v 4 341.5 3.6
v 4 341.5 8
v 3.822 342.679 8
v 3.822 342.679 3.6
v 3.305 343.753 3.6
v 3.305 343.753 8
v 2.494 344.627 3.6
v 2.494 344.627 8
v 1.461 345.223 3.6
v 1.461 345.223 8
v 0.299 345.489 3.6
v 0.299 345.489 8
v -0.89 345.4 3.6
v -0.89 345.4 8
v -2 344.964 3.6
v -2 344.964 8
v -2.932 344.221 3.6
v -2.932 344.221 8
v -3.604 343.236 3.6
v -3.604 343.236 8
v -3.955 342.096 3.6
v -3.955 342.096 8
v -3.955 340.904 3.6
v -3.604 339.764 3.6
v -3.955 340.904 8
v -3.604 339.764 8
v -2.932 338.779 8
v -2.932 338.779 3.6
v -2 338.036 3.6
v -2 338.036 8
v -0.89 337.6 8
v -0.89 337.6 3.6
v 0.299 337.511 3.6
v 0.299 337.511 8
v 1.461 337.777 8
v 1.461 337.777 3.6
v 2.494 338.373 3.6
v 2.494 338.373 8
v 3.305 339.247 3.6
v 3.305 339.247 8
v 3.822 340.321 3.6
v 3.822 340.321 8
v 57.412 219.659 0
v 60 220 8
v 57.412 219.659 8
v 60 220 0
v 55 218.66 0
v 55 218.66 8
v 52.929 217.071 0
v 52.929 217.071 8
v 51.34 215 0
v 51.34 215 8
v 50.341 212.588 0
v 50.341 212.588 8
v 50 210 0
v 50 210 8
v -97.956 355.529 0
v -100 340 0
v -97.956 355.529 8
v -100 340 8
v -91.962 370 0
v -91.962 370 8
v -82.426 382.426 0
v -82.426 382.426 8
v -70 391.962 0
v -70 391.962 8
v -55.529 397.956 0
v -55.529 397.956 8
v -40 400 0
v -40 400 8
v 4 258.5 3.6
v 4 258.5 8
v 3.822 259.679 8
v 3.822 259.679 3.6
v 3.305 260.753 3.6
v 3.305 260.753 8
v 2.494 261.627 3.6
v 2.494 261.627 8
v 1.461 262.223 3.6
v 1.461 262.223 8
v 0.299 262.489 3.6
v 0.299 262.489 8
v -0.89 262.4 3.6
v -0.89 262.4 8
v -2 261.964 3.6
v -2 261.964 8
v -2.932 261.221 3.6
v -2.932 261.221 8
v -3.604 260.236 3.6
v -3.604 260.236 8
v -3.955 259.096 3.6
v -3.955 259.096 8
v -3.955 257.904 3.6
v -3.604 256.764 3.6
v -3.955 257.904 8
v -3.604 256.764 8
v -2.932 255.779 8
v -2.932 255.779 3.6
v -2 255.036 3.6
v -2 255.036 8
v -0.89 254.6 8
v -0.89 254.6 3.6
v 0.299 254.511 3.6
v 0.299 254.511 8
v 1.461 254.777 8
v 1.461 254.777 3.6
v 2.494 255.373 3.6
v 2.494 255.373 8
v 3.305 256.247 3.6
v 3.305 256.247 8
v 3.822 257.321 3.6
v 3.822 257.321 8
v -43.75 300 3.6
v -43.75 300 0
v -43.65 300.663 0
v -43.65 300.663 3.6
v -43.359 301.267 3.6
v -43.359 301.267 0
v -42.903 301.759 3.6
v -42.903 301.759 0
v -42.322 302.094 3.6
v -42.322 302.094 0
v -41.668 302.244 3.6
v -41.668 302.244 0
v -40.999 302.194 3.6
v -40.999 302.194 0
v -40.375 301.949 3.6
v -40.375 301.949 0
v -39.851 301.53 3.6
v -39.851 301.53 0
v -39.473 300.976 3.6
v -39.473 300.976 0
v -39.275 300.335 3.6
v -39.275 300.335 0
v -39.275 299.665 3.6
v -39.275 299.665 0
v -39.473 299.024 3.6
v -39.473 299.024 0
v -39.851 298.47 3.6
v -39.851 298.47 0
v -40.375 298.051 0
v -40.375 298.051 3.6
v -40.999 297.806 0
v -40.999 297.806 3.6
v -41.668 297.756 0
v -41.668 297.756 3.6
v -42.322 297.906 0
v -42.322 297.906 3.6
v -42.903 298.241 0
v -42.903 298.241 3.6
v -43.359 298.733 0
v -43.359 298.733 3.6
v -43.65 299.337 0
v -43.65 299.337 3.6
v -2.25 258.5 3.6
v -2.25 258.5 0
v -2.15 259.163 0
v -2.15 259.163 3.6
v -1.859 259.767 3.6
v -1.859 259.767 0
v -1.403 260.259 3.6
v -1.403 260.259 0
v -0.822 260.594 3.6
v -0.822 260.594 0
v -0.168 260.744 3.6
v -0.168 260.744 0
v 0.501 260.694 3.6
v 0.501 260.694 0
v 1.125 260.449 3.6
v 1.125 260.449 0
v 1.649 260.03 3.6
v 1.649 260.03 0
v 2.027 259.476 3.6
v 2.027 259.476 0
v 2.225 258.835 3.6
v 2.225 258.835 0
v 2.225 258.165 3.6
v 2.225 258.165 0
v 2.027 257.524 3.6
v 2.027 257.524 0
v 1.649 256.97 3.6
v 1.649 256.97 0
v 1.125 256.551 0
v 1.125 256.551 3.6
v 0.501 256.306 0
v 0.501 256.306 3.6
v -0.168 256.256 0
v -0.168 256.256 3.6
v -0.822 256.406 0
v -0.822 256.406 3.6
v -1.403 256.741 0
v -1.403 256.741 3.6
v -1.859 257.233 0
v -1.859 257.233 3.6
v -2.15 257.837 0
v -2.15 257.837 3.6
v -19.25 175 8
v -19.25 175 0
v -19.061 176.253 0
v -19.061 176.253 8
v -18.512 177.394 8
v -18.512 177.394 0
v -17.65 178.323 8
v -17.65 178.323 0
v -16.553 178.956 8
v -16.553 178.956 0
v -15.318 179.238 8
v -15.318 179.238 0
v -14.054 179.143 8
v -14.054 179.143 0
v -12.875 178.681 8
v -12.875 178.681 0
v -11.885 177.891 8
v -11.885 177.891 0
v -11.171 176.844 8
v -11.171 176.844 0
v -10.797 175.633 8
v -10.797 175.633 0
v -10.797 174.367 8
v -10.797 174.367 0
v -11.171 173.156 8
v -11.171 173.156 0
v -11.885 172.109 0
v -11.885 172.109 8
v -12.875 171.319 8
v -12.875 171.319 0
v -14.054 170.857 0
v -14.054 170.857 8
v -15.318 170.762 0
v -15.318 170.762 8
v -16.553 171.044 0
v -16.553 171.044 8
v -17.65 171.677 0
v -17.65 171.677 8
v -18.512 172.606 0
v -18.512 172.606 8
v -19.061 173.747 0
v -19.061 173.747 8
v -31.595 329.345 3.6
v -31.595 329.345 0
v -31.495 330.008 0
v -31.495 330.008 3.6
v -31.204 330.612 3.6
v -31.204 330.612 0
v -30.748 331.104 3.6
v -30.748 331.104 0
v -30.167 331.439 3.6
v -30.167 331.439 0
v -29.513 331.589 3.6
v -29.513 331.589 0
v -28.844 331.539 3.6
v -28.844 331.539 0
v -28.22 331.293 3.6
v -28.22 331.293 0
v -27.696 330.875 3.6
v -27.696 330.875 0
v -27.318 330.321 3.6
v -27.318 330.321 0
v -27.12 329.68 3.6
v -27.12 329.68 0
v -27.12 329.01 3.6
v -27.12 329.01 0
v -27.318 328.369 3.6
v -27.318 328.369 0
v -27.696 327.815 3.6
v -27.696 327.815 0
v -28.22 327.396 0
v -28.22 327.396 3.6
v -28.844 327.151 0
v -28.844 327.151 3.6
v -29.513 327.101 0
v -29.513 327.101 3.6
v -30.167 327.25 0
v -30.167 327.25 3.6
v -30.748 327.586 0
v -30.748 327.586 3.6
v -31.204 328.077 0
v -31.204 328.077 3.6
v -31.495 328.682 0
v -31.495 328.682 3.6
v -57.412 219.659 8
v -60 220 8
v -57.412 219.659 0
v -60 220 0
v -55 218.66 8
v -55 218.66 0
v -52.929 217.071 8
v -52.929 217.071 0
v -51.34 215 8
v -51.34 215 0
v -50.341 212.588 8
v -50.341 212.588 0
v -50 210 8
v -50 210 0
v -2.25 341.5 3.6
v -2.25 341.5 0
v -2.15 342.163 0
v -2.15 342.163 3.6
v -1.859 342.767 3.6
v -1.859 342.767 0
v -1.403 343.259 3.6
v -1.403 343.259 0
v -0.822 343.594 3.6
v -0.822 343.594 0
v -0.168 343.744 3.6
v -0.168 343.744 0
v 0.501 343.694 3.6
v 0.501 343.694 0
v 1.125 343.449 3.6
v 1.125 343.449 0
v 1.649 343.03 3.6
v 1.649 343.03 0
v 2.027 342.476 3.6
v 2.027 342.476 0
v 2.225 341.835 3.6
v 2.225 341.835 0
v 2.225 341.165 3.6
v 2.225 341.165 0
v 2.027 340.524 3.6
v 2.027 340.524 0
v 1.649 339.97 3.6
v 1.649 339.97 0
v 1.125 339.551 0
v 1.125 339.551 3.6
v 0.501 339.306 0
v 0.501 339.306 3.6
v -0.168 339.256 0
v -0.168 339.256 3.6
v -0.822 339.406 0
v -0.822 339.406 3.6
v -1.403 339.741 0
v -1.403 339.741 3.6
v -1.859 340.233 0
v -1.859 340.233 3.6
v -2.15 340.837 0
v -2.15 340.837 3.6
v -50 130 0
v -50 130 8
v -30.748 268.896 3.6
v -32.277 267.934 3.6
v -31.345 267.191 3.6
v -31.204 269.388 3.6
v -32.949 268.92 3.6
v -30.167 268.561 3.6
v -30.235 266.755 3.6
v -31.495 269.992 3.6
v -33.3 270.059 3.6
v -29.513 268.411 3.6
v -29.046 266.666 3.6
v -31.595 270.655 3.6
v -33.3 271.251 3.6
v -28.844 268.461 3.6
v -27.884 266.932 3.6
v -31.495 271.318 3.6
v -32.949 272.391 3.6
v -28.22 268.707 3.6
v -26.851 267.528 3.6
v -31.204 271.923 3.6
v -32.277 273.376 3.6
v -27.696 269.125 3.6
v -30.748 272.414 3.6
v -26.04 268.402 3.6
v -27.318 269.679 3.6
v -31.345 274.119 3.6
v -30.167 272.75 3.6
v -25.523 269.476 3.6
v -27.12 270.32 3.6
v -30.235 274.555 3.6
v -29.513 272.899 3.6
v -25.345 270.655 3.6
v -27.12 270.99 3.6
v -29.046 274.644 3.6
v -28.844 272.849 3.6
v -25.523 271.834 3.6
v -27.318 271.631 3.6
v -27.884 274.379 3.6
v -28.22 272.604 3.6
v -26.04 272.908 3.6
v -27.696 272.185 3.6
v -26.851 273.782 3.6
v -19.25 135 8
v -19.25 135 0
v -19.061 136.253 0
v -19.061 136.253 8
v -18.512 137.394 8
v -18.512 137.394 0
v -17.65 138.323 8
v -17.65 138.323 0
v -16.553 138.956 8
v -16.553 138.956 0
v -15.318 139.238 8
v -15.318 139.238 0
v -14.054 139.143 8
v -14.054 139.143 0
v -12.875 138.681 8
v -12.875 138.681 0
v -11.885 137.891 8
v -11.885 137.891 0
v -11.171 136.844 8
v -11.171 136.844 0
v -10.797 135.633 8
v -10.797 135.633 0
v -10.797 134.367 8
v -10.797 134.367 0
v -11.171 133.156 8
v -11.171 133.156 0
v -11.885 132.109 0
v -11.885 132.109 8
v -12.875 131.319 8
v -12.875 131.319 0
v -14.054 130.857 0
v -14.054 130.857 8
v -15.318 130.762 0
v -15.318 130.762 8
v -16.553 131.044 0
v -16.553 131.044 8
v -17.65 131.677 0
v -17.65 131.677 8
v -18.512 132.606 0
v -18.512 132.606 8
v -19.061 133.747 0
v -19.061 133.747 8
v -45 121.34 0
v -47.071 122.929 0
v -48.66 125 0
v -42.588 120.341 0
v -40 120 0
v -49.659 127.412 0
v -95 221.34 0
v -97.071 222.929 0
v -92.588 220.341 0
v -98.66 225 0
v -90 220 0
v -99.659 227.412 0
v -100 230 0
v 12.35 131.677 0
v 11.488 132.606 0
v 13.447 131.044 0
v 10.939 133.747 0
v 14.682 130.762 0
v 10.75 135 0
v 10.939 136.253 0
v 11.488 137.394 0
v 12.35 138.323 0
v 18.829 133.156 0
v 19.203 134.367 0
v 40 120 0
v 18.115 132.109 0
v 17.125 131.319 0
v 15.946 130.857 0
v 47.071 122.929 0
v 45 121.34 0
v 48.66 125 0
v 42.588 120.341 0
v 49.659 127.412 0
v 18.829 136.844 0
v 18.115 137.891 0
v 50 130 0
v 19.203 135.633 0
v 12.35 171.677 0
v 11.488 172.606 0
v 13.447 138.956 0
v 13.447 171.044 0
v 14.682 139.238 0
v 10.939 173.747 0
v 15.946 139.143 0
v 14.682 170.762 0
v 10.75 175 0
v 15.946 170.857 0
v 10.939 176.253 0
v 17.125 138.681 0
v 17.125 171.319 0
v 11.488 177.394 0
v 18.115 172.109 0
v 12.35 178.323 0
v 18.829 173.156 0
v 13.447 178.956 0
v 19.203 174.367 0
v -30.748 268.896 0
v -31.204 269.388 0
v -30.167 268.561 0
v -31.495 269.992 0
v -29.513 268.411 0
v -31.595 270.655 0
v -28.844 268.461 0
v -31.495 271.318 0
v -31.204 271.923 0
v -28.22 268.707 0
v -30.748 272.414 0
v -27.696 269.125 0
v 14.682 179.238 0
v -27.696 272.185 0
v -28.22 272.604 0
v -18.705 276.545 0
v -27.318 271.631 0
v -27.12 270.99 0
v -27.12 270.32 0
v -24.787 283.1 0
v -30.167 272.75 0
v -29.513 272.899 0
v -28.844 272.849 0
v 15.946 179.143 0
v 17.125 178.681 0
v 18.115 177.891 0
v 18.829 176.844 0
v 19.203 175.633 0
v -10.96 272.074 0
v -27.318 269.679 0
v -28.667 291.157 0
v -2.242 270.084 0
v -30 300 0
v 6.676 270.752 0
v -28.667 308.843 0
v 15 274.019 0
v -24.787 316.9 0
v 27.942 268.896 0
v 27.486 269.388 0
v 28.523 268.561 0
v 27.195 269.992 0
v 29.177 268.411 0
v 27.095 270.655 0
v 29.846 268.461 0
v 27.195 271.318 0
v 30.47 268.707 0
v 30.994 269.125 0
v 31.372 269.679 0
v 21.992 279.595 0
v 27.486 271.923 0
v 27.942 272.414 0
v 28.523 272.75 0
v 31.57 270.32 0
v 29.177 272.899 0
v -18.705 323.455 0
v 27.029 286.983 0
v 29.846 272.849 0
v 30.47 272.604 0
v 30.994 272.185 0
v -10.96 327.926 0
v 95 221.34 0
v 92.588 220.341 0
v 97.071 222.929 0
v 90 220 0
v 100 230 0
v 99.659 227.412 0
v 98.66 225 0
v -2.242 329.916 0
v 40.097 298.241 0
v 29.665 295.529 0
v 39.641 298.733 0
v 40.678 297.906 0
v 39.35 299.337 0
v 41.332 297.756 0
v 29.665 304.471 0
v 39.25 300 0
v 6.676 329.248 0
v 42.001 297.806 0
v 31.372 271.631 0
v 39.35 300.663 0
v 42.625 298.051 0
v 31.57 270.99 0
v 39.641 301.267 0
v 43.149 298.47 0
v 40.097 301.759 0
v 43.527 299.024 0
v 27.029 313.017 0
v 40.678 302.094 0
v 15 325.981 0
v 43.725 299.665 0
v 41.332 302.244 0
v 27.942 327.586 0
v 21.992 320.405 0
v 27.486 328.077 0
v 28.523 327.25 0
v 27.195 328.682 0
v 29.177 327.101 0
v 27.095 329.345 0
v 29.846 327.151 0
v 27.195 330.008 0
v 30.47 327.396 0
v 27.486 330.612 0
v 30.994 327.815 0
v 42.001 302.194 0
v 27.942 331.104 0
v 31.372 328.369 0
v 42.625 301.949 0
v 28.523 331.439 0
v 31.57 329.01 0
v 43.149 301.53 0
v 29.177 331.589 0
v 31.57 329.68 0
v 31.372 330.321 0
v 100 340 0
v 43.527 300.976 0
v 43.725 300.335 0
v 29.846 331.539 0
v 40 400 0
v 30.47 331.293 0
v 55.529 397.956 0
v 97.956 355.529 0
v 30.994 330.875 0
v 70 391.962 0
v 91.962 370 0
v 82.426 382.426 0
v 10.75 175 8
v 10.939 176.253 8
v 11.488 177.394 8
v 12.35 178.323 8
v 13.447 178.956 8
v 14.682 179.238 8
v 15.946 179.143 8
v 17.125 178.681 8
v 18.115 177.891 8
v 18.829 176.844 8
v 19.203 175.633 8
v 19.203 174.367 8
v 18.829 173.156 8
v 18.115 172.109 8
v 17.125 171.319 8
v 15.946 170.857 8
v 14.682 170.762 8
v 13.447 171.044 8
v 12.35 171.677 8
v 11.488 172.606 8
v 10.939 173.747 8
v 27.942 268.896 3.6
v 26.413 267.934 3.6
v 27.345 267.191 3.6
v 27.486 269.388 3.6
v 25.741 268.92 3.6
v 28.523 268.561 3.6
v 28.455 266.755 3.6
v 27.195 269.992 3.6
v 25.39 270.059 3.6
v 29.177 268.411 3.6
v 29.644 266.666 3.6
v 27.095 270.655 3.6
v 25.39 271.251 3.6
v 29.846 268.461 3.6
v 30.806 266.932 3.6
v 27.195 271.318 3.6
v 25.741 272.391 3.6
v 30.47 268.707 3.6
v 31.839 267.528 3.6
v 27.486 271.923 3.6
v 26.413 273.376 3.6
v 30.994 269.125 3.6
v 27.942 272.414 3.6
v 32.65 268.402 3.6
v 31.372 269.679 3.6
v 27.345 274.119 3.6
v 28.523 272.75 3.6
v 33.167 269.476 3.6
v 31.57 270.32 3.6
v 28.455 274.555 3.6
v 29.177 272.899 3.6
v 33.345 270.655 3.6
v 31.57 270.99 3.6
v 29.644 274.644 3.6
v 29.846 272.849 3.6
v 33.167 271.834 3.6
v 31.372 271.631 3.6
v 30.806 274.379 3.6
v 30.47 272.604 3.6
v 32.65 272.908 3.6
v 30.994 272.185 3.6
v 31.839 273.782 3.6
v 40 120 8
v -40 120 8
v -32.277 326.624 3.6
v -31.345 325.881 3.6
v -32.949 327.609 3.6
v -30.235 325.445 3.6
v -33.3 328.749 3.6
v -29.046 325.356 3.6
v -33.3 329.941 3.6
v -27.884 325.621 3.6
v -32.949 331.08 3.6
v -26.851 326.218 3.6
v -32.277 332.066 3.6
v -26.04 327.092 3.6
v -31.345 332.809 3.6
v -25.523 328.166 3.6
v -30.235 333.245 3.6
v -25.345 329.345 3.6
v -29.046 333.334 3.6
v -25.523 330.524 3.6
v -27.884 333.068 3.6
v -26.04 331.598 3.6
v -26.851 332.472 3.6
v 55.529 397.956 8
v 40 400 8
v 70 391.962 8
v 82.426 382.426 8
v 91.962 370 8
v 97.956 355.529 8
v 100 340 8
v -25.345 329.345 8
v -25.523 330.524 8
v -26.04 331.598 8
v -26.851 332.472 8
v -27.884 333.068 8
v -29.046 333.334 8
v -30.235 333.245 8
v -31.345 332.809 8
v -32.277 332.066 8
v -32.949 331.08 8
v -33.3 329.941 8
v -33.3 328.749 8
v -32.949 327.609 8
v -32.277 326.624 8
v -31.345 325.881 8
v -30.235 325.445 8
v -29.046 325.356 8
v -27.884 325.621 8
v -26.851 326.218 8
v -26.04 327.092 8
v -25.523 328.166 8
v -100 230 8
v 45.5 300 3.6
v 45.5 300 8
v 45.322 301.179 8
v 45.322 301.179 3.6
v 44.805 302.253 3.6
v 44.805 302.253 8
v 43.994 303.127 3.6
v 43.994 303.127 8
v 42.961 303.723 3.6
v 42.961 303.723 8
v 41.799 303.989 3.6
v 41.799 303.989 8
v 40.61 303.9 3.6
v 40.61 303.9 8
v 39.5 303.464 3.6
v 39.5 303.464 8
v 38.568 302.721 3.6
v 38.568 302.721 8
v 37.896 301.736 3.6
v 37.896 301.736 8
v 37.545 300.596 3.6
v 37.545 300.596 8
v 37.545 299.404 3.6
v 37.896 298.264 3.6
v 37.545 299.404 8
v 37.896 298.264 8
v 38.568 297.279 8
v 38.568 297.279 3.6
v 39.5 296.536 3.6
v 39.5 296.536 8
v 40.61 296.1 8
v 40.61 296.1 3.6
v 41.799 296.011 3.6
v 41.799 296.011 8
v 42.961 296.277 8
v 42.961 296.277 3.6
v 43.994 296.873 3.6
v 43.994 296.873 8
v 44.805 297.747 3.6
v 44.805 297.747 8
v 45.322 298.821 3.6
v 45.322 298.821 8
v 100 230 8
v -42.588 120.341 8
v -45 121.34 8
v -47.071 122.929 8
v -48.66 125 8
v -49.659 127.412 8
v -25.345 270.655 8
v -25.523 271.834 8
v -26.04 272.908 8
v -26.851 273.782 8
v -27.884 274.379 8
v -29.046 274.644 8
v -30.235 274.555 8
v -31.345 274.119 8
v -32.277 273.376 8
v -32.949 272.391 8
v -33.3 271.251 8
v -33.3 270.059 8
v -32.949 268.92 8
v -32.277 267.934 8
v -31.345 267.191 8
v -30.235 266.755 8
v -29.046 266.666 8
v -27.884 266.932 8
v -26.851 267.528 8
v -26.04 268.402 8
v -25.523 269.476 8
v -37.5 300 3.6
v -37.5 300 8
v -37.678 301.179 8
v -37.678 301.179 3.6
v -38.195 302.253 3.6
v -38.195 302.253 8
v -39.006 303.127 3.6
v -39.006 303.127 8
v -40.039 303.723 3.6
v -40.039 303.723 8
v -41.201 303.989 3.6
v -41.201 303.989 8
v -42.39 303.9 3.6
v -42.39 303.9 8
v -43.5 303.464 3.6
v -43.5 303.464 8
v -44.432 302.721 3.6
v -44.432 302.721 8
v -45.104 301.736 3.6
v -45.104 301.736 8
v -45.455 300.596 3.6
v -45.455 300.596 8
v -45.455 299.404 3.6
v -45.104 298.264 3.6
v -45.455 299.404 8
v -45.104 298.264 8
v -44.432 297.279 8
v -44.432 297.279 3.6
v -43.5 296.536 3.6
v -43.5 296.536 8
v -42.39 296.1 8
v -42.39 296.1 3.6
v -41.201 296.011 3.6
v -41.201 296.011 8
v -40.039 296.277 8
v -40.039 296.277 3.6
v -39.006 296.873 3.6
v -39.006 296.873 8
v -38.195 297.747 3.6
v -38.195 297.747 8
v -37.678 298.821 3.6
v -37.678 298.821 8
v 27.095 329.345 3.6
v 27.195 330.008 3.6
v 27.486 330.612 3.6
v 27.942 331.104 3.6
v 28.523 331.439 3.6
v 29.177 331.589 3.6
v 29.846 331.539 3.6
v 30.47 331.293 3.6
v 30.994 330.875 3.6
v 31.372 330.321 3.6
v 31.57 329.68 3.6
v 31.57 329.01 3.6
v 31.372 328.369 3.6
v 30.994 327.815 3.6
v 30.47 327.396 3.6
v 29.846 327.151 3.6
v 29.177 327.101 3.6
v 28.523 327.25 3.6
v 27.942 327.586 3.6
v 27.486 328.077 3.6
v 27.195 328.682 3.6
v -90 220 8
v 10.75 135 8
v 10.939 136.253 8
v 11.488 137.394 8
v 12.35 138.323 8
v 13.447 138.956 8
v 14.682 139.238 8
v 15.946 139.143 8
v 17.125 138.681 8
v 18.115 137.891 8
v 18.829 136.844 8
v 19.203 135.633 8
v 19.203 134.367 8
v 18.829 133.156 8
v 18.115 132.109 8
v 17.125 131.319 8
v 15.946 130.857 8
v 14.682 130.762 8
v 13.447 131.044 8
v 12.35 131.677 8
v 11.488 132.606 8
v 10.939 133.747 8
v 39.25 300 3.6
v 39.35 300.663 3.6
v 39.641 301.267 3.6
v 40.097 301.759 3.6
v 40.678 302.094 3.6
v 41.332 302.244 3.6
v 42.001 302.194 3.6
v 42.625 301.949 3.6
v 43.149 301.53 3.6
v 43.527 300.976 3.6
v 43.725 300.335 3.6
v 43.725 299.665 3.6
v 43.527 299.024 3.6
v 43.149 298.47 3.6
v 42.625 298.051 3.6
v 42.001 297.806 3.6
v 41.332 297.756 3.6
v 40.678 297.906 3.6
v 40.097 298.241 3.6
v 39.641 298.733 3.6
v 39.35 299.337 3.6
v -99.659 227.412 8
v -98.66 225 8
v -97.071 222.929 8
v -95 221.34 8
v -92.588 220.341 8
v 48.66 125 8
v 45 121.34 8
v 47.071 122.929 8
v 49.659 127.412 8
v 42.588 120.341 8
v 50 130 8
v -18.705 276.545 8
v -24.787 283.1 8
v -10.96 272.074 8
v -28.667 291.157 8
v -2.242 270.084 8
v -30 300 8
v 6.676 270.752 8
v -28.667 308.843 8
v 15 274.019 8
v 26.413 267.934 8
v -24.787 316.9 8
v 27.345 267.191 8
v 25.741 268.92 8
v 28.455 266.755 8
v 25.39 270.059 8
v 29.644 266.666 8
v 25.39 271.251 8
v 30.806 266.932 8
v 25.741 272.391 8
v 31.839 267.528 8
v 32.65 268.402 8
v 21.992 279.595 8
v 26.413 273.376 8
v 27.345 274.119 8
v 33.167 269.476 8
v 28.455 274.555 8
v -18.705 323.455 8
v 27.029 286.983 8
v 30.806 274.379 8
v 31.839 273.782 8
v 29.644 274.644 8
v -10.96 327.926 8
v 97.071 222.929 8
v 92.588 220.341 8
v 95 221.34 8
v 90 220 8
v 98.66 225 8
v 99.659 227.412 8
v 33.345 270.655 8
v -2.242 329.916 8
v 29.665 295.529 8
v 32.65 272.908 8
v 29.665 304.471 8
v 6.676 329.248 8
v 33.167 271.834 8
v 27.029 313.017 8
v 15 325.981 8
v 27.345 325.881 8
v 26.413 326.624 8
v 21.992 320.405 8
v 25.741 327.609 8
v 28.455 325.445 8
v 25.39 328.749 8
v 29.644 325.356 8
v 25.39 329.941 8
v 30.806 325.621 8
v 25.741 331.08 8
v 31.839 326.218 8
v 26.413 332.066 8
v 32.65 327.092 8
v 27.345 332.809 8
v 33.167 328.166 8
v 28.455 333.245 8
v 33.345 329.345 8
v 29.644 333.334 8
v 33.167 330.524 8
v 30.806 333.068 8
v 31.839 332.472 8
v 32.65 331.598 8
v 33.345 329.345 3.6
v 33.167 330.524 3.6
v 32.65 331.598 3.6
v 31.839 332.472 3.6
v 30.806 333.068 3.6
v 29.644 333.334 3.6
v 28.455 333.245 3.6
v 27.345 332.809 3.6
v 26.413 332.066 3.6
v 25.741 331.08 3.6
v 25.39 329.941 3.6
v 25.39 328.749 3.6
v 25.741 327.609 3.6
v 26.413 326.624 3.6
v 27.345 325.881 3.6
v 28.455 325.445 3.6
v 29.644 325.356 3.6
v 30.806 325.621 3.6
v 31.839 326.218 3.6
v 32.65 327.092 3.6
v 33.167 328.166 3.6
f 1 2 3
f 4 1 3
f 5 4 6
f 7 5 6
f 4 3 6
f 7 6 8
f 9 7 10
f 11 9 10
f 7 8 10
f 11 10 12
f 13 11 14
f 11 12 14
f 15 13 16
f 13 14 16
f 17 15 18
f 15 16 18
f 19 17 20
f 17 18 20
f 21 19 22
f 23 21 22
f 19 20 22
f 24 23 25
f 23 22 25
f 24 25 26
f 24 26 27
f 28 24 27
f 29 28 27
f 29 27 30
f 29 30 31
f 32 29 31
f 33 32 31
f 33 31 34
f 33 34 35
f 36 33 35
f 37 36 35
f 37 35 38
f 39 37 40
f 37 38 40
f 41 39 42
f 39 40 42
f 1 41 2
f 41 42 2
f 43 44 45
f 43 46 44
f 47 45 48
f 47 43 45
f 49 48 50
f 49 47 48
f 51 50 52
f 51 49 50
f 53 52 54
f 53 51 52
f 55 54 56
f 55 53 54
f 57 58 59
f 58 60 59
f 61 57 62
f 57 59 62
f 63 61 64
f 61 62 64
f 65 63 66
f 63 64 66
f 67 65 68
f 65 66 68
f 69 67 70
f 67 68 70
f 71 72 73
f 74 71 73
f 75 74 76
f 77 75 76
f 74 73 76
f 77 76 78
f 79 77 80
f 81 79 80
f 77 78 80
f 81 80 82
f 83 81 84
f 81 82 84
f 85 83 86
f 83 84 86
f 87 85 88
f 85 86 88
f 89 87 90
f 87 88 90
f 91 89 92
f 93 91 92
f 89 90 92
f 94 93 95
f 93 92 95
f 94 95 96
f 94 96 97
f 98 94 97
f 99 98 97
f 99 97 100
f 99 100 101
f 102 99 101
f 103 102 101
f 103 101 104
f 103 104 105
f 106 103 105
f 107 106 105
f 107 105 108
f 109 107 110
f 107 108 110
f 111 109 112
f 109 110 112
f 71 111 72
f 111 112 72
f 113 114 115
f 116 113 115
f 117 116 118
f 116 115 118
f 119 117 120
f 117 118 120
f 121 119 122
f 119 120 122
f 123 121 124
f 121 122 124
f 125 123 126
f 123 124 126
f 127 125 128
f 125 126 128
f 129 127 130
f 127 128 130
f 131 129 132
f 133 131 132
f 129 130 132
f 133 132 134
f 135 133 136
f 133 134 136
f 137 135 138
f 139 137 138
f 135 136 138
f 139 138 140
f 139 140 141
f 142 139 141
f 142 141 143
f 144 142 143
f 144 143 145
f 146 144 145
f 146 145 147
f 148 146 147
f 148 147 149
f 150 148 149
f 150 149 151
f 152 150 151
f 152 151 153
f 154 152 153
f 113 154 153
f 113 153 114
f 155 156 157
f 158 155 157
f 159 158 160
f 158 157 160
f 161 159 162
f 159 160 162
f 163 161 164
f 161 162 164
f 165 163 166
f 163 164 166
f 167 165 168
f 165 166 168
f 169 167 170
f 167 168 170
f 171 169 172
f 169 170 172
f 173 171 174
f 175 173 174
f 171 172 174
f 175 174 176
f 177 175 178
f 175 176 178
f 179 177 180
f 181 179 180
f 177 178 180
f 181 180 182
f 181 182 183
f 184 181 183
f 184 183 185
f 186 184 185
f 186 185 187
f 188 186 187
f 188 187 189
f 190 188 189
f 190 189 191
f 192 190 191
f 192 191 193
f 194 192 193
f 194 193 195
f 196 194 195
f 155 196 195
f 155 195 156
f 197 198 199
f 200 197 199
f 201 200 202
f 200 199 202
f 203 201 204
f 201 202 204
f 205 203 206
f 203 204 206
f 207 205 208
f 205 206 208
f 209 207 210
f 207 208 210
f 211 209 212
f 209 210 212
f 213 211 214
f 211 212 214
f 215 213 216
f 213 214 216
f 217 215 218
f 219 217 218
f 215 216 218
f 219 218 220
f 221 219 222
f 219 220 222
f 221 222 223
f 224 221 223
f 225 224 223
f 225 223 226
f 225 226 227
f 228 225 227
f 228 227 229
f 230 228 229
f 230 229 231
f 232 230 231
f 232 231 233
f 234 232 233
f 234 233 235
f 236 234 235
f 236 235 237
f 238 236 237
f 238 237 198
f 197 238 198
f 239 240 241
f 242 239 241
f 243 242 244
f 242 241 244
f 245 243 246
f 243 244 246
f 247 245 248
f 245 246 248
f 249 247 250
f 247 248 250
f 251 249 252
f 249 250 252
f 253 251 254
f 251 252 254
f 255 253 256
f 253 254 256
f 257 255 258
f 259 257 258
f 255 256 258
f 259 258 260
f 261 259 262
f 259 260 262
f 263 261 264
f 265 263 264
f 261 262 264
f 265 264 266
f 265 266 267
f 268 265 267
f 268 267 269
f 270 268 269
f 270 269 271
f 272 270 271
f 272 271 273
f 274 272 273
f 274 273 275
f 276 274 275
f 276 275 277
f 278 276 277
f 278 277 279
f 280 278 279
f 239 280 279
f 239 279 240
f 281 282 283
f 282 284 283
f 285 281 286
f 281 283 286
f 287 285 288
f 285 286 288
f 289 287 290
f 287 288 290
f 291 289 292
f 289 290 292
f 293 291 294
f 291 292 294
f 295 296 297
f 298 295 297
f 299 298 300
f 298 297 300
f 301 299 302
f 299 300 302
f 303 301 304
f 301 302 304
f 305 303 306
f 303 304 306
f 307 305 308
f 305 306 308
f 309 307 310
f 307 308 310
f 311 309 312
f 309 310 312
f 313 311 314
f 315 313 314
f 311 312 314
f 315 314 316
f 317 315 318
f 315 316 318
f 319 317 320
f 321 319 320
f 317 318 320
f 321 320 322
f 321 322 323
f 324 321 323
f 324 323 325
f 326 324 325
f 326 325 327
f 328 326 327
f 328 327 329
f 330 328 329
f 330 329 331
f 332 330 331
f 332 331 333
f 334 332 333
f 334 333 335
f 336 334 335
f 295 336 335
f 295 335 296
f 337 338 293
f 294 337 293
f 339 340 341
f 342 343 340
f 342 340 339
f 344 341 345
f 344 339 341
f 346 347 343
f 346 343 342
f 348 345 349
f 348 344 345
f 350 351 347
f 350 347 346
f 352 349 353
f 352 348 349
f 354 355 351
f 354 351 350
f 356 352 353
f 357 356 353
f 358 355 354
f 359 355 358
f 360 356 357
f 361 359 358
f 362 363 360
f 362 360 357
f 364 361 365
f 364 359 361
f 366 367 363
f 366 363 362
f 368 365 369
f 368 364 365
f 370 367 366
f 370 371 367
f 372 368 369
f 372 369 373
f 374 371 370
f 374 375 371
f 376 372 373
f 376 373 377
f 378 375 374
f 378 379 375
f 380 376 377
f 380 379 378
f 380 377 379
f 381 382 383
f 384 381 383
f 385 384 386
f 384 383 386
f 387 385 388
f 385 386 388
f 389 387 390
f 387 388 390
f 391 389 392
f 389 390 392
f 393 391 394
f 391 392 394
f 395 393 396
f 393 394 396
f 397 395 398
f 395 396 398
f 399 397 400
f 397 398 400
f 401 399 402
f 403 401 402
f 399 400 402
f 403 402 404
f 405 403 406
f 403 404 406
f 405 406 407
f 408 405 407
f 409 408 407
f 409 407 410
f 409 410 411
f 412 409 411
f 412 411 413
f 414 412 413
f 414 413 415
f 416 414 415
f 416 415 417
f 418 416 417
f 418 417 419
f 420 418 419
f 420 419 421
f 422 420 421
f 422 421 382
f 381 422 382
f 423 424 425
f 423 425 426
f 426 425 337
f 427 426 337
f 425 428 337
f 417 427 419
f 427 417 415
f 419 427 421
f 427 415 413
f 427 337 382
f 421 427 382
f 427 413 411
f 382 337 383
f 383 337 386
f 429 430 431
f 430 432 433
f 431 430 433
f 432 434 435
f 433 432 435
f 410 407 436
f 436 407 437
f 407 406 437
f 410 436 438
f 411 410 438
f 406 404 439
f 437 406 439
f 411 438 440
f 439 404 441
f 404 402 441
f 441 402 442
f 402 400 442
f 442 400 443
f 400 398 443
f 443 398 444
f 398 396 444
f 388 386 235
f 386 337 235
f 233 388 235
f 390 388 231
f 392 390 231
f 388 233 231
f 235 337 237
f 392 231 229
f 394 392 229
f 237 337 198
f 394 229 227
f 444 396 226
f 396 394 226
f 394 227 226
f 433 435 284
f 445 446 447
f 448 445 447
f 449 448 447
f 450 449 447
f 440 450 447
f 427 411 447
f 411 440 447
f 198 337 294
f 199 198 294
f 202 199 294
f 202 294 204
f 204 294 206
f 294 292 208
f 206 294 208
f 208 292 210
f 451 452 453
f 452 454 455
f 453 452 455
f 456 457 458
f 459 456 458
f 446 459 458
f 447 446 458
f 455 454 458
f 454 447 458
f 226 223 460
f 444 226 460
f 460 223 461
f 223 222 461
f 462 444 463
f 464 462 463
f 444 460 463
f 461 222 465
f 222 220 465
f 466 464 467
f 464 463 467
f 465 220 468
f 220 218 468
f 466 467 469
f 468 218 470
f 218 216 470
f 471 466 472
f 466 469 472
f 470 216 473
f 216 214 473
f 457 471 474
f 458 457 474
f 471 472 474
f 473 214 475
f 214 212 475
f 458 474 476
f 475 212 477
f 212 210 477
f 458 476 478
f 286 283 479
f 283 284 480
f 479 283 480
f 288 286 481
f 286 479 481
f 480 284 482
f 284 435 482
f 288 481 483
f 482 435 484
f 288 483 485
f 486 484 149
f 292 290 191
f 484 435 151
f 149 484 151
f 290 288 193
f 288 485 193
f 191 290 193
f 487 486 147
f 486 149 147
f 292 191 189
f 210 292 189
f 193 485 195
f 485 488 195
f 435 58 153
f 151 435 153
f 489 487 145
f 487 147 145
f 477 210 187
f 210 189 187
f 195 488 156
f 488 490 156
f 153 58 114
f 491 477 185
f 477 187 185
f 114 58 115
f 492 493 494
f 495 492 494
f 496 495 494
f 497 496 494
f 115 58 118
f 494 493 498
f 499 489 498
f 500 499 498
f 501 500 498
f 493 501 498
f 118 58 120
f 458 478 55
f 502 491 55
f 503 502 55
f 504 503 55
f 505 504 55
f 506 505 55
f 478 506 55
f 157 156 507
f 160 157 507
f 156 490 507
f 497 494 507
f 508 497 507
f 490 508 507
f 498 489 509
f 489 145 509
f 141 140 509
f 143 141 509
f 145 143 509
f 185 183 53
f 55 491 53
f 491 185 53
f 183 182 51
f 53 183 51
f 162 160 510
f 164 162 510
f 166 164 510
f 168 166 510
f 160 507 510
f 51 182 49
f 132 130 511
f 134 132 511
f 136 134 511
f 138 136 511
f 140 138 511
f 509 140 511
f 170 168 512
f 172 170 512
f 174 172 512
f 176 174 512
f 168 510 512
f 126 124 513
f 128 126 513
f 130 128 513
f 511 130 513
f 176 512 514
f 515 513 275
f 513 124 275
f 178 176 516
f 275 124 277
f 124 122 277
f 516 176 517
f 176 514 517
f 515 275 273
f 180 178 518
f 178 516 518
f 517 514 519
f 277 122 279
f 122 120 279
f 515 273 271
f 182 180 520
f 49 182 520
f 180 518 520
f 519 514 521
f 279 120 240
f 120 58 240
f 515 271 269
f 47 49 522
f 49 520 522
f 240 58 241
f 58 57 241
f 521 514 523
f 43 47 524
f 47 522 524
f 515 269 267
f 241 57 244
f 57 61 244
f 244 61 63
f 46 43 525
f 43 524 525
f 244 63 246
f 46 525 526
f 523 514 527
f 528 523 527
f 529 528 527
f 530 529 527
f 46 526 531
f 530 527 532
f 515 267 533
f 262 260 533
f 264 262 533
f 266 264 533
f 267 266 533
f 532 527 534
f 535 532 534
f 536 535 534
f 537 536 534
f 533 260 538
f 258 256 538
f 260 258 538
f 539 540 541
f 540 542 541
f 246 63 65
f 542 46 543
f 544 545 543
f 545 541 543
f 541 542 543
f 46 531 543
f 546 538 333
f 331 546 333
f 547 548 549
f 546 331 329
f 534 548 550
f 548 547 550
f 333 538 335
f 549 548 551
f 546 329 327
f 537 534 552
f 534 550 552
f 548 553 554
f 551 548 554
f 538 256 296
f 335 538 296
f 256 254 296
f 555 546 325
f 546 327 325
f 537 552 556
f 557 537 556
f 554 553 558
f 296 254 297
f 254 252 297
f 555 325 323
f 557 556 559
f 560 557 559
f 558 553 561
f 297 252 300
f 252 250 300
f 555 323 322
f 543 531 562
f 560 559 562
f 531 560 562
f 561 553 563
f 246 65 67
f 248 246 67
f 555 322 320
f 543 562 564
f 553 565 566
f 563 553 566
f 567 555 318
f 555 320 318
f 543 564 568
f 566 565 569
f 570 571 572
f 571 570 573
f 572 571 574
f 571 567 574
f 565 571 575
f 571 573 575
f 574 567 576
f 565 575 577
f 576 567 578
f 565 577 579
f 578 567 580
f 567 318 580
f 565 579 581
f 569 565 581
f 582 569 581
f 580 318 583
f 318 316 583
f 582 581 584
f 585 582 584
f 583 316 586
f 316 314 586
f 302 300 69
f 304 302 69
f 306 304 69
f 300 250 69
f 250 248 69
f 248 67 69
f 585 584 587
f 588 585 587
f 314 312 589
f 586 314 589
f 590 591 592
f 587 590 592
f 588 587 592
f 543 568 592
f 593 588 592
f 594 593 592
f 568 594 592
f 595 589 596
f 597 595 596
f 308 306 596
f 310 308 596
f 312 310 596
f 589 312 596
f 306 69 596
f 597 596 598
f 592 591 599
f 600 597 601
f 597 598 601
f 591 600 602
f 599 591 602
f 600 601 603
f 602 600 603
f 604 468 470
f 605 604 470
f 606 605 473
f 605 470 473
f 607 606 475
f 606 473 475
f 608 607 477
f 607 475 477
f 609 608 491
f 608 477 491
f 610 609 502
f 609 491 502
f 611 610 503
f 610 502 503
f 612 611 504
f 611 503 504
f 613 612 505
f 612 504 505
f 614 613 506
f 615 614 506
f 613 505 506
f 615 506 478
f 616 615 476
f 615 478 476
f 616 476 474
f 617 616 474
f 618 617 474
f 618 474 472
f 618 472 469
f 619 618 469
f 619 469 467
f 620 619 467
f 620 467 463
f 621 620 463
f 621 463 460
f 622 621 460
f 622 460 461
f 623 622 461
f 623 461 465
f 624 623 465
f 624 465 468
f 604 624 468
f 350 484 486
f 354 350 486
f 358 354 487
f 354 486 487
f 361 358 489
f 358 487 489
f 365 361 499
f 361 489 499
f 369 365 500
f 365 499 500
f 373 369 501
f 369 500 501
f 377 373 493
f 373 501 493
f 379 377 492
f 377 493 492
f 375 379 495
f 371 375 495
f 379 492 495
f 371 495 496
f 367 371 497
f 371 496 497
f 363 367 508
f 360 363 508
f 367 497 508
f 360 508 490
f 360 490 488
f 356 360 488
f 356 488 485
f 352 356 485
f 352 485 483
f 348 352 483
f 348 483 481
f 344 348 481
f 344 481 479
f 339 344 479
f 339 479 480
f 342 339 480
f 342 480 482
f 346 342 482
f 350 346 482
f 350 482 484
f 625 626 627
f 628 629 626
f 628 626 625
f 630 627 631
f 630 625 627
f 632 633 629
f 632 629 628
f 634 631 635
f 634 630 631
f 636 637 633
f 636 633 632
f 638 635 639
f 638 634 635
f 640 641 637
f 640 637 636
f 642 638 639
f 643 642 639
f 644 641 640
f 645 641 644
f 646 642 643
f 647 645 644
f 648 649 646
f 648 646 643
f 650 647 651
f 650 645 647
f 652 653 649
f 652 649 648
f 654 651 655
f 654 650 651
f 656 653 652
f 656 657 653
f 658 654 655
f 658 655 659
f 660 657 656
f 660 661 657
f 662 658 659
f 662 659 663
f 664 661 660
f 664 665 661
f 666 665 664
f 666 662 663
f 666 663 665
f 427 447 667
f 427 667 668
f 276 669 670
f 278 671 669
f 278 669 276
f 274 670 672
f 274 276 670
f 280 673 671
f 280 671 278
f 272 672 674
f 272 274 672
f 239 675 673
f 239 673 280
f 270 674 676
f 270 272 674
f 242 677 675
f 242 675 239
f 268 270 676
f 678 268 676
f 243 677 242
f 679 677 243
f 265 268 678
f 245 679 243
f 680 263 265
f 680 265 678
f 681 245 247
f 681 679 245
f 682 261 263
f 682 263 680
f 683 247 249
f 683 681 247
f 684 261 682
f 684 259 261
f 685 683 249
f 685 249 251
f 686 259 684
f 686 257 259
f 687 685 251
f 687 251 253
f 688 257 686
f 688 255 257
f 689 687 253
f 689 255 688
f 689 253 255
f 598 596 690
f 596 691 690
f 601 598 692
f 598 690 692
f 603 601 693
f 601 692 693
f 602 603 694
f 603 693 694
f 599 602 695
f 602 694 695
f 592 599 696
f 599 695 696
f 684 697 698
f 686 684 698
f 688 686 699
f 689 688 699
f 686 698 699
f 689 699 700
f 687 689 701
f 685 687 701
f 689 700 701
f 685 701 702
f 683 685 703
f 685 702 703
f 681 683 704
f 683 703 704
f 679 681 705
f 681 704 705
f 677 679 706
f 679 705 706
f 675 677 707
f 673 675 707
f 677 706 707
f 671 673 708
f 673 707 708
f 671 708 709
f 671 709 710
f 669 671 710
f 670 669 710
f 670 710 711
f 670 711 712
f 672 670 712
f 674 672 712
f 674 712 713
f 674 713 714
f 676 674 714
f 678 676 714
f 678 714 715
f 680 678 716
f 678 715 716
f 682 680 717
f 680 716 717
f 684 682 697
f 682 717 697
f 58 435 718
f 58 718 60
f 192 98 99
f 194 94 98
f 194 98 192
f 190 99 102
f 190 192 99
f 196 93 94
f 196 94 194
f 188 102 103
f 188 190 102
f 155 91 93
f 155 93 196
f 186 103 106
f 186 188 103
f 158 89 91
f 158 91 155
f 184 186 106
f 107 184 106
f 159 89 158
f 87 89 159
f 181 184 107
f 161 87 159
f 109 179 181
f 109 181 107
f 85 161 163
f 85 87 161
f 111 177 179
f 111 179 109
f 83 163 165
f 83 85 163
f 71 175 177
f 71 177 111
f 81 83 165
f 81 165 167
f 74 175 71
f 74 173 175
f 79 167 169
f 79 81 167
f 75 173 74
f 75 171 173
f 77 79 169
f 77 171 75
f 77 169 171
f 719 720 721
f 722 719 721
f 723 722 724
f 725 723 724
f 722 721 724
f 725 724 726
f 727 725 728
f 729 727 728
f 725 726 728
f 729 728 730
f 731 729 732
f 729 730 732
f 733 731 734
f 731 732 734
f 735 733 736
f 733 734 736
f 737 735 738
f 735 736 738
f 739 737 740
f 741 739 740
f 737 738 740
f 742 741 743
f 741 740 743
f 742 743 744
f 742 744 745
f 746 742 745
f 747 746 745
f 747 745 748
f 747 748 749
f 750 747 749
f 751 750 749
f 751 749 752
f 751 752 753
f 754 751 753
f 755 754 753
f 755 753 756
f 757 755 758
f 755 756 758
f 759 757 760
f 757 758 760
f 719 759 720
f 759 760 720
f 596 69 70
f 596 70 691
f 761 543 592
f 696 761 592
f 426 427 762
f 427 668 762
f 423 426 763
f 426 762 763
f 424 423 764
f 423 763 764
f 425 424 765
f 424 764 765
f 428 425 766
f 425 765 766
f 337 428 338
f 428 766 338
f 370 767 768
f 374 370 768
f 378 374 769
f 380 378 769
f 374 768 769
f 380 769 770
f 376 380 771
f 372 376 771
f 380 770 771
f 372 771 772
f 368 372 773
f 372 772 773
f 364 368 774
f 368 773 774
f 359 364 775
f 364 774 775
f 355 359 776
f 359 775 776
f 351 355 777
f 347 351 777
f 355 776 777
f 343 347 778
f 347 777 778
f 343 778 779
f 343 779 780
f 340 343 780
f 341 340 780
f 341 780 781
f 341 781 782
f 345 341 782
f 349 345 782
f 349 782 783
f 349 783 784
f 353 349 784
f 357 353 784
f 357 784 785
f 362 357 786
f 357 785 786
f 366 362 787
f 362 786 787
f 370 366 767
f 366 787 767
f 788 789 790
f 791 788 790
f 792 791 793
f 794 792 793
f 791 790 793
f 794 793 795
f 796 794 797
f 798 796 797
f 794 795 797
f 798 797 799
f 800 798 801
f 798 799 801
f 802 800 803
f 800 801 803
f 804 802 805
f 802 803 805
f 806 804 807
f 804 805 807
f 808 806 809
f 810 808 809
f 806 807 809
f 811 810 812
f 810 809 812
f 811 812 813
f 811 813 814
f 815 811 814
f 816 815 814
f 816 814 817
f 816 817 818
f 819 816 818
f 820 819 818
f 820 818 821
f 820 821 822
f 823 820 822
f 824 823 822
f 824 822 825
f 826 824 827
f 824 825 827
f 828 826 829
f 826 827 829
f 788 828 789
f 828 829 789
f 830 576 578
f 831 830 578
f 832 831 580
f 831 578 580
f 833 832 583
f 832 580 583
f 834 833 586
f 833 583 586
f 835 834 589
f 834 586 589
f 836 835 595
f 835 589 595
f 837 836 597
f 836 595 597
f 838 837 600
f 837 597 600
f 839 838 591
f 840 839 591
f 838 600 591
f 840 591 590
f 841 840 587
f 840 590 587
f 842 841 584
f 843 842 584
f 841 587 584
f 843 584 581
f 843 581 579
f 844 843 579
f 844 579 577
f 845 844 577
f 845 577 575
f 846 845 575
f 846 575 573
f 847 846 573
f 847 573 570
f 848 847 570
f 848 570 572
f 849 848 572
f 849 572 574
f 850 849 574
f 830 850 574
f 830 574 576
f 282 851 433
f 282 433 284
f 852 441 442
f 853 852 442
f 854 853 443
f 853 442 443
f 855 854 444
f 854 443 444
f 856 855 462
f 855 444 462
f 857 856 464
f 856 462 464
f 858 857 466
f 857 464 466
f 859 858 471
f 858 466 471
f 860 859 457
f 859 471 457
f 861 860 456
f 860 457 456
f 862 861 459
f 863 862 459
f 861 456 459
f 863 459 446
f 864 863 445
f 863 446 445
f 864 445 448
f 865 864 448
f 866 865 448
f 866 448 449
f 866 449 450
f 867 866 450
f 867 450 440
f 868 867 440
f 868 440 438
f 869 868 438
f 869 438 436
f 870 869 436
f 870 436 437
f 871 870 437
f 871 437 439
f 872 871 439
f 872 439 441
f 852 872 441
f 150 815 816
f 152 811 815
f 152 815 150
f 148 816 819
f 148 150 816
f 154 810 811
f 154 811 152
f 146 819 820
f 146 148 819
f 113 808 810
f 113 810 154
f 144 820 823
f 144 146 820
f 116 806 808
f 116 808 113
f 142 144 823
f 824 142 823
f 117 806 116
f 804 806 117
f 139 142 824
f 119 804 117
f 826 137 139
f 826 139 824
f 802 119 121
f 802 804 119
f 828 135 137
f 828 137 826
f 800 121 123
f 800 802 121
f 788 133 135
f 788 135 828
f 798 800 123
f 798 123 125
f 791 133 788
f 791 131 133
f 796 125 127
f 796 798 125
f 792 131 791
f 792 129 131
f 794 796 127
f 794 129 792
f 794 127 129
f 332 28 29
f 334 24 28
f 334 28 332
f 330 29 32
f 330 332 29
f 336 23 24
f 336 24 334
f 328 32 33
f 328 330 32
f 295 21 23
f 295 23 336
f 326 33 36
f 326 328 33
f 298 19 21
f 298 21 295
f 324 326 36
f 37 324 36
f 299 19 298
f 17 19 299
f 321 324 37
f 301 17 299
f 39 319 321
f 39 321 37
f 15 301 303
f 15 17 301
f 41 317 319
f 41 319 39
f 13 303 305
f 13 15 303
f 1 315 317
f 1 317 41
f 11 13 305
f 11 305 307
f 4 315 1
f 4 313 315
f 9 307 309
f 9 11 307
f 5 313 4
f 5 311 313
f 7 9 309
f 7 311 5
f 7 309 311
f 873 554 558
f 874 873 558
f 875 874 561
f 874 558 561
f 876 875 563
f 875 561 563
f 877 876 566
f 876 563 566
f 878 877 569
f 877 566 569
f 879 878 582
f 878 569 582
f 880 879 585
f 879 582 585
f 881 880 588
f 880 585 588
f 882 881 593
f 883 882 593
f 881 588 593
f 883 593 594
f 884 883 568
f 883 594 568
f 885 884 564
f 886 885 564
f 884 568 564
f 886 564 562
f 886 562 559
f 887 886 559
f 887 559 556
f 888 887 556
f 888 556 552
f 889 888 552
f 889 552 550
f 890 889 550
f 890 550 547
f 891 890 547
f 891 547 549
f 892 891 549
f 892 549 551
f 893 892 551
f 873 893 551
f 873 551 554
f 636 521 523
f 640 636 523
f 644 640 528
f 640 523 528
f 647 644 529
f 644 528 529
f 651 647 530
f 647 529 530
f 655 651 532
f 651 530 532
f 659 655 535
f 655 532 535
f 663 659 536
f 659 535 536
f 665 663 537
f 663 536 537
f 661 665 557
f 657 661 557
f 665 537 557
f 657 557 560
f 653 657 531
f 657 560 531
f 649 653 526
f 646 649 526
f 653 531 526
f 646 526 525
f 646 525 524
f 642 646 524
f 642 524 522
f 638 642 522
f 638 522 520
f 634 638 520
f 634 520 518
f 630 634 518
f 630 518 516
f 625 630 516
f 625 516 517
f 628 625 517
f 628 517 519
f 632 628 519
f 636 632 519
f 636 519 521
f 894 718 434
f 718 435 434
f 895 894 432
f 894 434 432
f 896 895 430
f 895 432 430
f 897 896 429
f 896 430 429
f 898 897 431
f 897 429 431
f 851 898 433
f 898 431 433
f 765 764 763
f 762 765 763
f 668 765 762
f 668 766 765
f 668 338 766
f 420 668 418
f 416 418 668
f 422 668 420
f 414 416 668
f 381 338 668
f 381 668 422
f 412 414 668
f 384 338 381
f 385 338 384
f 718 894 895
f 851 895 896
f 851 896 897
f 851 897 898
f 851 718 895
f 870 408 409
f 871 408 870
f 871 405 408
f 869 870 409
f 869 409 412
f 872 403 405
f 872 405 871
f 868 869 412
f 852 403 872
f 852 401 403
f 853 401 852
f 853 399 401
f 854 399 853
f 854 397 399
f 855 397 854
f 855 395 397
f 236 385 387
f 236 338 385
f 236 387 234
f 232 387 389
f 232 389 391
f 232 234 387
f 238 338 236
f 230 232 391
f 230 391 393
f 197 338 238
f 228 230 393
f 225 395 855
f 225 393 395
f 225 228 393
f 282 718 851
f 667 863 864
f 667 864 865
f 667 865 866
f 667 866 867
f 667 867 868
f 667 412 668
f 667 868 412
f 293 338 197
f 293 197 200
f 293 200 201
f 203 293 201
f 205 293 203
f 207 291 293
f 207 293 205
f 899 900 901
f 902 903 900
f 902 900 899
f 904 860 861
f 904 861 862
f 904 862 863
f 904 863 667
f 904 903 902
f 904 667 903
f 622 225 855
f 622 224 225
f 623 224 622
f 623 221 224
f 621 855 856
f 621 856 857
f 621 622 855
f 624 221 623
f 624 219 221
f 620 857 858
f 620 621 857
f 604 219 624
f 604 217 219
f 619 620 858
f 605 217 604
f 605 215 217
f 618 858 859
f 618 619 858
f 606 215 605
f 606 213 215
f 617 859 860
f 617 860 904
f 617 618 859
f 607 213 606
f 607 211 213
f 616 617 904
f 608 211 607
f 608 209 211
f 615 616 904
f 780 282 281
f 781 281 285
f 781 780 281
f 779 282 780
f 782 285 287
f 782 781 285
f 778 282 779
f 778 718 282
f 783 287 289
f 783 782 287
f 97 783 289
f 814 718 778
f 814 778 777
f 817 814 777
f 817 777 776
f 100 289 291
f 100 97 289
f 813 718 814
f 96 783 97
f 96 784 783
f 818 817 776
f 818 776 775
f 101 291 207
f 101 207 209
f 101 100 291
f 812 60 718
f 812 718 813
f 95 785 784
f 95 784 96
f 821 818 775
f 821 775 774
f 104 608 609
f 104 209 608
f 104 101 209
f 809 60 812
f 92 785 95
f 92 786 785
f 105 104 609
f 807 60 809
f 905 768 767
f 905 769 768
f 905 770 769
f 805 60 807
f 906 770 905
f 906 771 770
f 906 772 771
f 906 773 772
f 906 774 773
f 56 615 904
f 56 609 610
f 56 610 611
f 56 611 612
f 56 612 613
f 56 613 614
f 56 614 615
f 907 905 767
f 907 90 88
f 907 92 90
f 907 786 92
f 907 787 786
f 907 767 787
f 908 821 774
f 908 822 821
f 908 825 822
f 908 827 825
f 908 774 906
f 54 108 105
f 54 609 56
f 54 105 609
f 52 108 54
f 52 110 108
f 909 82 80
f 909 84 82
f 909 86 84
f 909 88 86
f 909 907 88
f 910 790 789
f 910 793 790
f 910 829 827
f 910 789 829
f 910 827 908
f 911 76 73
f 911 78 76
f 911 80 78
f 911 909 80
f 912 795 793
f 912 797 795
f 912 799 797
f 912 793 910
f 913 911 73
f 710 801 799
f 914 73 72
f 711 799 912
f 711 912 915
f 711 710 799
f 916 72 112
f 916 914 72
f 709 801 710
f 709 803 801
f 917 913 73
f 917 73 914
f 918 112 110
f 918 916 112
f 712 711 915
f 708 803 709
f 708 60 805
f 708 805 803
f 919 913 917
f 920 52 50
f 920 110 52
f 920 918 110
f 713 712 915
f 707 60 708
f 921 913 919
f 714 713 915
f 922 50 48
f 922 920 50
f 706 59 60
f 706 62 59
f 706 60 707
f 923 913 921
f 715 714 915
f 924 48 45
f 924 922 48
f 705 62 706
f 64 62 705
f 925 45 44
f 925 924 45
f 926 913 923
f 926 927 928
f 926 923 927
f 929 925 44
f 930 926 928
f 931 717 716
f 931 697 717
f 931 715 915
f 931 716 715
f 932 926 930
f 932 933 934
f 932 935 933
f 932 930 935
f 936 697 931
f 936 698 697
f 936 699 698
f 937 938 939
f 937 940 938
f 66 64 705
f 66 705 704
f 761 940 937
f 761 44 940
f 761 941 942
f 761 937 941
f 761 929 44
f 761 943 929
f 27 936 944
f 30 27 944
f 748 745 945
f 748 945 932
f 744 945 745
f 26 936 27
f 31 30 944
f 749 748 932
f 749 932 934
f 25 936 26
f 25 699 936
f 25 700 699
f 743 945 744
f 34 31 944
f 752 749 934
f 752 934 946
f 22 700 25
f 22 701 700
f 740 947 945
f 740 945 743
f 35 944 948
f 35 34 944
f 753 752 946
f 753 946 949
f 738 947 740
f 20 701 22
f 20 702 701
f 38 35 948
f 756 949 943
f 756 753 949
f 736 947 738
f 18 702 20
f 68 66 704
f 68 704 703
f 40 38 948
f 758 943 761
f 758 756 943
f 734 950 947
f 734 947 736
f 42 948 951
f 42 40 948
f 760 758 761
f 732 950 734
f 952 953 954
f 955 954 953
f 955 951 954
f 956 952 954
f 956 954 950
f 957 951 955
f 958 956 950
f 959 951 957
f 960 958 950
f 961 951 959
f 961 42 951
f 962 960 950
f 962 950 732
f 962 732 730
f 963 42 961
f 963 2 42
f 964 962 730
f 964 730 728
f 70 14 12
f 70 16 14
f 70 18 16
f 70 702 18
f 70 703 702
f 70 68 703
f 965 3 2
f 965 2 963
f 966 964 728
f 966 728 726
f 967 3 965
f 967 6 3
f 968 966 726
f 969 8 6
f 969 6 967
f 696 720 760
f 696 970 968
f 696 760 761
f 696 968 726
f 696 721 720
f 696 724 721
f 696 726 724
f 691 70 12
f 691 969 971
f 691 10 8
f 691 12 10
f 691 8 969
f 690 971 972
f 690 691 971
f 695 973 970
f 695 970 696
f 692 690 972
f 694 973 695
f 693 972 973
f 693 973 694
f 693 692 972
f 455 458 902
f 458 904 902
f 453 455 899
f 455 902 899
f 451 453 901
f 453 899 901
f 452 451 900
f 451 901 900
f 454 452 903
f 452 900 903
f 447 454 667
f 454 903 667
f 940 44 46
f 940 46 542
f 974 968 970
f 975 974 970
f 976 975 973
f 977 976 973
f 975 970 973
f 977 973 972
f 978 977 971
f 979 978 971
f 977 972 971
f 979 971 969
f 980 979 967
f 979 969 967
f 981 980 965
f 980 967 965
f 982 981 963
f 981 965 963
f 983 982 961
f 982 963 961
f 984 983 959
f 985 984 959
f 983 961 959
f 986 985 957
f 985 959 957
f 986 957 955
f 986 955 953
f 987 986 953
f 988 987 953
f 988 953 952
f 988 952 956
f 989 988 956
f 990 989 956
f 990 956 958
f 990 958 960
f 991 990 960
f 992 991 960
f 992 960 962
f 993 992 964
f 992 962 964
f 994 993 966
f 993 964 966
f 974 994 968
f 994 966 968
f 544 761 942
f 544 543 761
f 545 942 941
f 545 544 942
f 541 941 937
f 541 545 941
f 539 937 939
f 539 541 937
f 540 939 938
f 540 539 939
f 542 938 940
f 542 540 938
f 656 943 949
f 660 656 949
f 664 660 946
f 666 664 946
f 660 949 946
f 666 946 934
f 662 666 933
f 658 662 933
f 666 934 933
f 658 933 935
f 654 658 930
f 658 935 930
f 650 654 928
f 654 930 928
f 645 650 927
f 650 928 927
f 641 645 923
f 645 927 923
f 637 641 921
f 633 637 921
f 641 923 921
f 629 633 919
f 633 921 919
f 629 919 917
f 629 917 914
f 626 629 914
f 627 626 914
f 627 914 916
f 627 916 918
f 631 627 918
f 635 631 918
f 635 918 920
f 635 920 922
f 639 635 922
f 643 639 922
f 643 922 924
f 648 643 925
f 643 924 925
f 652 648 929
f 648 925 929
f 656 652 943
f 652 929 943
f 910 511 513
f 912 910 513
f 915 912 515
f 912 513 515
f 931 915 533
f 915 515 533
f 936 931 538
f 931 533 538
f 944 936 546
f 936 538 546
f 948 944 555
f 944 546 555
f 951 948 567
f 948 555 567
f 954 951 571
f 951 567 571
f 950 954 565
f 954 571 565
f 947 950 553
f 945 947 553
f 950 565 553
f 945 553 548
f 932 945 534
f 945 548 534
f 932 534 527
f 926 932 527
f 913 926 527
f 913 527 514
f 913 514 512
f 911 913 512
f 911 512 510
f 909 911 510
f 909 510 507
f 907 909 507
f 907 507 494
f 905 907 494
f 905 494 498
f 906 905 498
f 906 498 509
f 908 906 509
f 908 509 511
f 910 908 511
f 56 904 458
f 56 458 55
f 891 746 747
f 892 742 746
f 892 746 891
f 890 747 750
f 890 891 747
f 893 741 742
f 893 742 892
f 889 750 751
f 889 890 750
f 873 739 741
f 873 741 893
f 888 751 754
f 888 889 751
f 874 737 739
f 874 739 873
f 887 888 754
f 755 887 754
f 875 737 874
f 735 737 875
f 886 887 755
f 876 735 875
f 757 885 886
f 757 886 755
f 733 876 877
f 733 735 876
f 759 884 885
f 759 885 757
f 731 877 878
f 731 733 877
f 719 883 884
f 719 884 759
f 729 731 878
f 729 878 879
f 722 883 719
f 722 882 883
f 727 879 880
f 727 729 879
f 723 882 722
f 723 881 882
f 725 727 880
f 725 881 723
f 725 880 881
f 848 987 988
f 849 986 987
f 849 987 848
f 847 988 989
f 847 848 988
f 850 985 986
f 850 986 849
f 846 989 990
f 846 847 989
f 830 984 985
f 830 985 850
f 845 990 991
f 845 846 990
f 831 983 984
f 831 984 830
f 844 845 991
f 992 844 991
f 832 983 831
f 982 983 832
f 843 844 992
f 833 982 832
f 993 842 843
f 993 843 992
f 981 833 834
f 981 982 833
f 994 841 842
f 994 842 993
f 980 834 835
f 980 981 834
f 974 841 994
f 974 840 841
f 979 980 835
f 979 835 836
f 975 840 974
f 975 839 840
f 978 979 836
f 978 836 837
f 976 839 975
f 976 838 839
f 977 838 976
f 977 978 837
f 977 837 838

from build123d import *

# Parameters (mm, degrees)
SKETCH_1_W          = 200
SKETCH_1_H          = 400
EXTRUDE_1_DEPTH     = 8
SKETCH_2_R          = 30
CUT_EXTRUDE_1_DEPTH = 10
SKETCH_3_R          = 2.25
CUT_EXTRUDE_2_DEPTH = 10
SKETCH_4_R          = 4
CUT_EXTRUDE_3_DEPTH = 4.4
FILLET_1_R          = 60
SKETCH_5_R          = 4.25
CUT_EXTRUDE_4_DEPTH = 10
SKETCH_6_W          = 50
SKETCH_6_H          = 220
CUT_EXTRUDE_5_DEPTH = 10
FILLET_2_R          = 10
SKETCH_7_W          = 100
SKETCH_7_H          = 120
CUT_EXTRUDE_6_DEPTH = 84
FILLET_3_R          = 10


with BuildPart() as part:
    # 草图1 → 凸台-拉伸1 (new body)
    with BuildSketch(Plane.XY):
        with Locations((0, 200)):
            Rectangle(SKETCH_1_W, SKETCH_1_H)
    extrude(amount=EXTRUDE_1_DEPTH)

    # 草图2 → 切除-拉伸1 (cut)
    with BuildSketch(Plane(origin=(0, 0, 0), x_dir=(-1, 0, 0), z_dir=(0, 0, -1))):
        with Locations((0, 300)):
            Circle(SKETCH_2_R)
    extrude(amount=-CUT_EXTRUDE_1_DEPTH, mode=Mode.SUBTRACT)

    # 草图3 → 切除-拉伸2 (cut)
    with BuildSketch(Plane(origin=(0, 0, 0), x_dir=(-1, 0, 0), z_dir=(0, 0, -1))):
        with Locations((0, 341.5)):
            Circle(SKETCH_3_R)
        with Locations((29.344931419, 329.344931419)):
            Circle(SKETCH_3_R)
        with Locations((41.5, 300)):
            Circle(SKETCH_3_R)
        with Locations((29.344931419, 270.655068581)):
            Circle(SKETCH_3_R)
        with Locations((0, 258.5)):
            Circle(SKETCH_3_R)
        with Locations((-29.344931419, 270.655068581)):
            Circle(SKETCH_3_R)
        with Locations((-41.5, 300)):
            Circle(SKETCH_3_R)
        with Locations((-29.344931419, 329.344931419)):
            Circle(SKETCH_3_R)
    extrude(amount=-CUT_EXTRUDE_2_DEPTH, mode=Mode.SUBTRACT)

    # 草图4 → 切除-拉伸3 (cut)
    with BuildSketch(Plane.XY.offset(8)):
        with Locations((29.344931419, 329.344931419)):
            Circle(SKETCH_4_R)
        with Locations((41.5, 300)):
            Circle(SKETCH_4_R)
        with Locations((29.344931419, 270.655068581)):
            Circle(SKETCH_4_R)
        with Locations((0, 258.5)):
            Circle(SKETCH_4_R)
        with Locations((-29.344931419, 270.655068581)):
            Circle(SKETCH_4_R)
        with Locations((-41.5, 300)):
            Circle(SKETCH_4_R)
        with Locations((-29.344931419, 329.344931419)):
            Circle(SKETCH_4_R)
        with Locations((0, 341.5)):
            Circle(SKETCH_4_R)
    extrude(amount=-CUT_EXTRUDE_3_DEPTH, mode=Mode.SUBTRACT)

    # 圆角1
    fillet_1_edges = [part.edges().sort_by_distance(p)[0] for p in [
        (100, 400, 4),
        (-100, 400, 4),
    ]]
    fillet(fillet_1_edges, radius=FILLET_1_R)

    # 草图5 → 切除-拉伸4 (cut)
    with BuildSketch(Plane(origin=(0, 0, 0), x_dir=(-1, 0, 0), z_dir=(0, 0, -1))):
        with Locations((-15, 25)):
            Circle(SKETCH_5_R)
        with Locations((15, 25)):
            Circle(SKETCH_5_R)
        with Locations((-15, 65)):
            Circle(SKETCH_5_R)
        with Locations((15, 65)):
            Circle(SKETCH_5_R)
        with Locations((-15, 175)):
            Circle(SKETCH_5_R)
        with Locations((-15, 135)):
            Circle(SKETCH_5_R)
        with Locations((15, 135)):
            Circle(SKETCH_5_R)
        with Locations((15, 175)):
            Circle(SKETCH_5_R)
    extrude(amount=-CUT_EXTRUDE_4_DEPTH, mode=Mode.SUBTRACT)

    # 草图6 → 切除-拉伸5 (cut)
    with BuildSketch(Plane.XY.offset(8)):
        with Locations((-75, 110)):
            Rectangle(SKETCH_6_W, SKETCH_6_H)
        with Locations((75, 110)):
            Rectangle(SKETCH_6_W, SKETCH_6_H)
    extrude(amount=-CUT_EXTRUDE_5_DEPTH, mode=Mode.SUBTRACT)

    # 圆角2
    fillet_2_edges = [part.edges().sort_by_distance(p)[0] for p in [
        (100, 220, 4),
        (50, 220, 4),
        (-100, 220, 4),
        (-50, 220, 4),
    ]]
    fillet(fillet_2_edges, radius=FILLET_2_R)

    # 草图7 → 切除-拉伸6 (cut)
    with BuildSketch(Plane(origin=(0, 0, 0), x_dir=(-1, 0, 0), z_dir=(0, 0, -1))):
        with Locations((0, 60)):
            Rectangle(SKETCH_7_W, SKETCH_7_H)
    extrude(amount=-CUT_EXTRUDE_6_DEPTH, mode=Mode.SUBTRACT)

    # 圆角3
    fillet_3_edges = [part.edges().sort_by_distance(p)[0] for p in [
        (50, 120, 4),
        (-50, 120, 4),
    ]]
    fillet(fillet_3_edges, radius=FILLET_3_R)


solid = part.part
